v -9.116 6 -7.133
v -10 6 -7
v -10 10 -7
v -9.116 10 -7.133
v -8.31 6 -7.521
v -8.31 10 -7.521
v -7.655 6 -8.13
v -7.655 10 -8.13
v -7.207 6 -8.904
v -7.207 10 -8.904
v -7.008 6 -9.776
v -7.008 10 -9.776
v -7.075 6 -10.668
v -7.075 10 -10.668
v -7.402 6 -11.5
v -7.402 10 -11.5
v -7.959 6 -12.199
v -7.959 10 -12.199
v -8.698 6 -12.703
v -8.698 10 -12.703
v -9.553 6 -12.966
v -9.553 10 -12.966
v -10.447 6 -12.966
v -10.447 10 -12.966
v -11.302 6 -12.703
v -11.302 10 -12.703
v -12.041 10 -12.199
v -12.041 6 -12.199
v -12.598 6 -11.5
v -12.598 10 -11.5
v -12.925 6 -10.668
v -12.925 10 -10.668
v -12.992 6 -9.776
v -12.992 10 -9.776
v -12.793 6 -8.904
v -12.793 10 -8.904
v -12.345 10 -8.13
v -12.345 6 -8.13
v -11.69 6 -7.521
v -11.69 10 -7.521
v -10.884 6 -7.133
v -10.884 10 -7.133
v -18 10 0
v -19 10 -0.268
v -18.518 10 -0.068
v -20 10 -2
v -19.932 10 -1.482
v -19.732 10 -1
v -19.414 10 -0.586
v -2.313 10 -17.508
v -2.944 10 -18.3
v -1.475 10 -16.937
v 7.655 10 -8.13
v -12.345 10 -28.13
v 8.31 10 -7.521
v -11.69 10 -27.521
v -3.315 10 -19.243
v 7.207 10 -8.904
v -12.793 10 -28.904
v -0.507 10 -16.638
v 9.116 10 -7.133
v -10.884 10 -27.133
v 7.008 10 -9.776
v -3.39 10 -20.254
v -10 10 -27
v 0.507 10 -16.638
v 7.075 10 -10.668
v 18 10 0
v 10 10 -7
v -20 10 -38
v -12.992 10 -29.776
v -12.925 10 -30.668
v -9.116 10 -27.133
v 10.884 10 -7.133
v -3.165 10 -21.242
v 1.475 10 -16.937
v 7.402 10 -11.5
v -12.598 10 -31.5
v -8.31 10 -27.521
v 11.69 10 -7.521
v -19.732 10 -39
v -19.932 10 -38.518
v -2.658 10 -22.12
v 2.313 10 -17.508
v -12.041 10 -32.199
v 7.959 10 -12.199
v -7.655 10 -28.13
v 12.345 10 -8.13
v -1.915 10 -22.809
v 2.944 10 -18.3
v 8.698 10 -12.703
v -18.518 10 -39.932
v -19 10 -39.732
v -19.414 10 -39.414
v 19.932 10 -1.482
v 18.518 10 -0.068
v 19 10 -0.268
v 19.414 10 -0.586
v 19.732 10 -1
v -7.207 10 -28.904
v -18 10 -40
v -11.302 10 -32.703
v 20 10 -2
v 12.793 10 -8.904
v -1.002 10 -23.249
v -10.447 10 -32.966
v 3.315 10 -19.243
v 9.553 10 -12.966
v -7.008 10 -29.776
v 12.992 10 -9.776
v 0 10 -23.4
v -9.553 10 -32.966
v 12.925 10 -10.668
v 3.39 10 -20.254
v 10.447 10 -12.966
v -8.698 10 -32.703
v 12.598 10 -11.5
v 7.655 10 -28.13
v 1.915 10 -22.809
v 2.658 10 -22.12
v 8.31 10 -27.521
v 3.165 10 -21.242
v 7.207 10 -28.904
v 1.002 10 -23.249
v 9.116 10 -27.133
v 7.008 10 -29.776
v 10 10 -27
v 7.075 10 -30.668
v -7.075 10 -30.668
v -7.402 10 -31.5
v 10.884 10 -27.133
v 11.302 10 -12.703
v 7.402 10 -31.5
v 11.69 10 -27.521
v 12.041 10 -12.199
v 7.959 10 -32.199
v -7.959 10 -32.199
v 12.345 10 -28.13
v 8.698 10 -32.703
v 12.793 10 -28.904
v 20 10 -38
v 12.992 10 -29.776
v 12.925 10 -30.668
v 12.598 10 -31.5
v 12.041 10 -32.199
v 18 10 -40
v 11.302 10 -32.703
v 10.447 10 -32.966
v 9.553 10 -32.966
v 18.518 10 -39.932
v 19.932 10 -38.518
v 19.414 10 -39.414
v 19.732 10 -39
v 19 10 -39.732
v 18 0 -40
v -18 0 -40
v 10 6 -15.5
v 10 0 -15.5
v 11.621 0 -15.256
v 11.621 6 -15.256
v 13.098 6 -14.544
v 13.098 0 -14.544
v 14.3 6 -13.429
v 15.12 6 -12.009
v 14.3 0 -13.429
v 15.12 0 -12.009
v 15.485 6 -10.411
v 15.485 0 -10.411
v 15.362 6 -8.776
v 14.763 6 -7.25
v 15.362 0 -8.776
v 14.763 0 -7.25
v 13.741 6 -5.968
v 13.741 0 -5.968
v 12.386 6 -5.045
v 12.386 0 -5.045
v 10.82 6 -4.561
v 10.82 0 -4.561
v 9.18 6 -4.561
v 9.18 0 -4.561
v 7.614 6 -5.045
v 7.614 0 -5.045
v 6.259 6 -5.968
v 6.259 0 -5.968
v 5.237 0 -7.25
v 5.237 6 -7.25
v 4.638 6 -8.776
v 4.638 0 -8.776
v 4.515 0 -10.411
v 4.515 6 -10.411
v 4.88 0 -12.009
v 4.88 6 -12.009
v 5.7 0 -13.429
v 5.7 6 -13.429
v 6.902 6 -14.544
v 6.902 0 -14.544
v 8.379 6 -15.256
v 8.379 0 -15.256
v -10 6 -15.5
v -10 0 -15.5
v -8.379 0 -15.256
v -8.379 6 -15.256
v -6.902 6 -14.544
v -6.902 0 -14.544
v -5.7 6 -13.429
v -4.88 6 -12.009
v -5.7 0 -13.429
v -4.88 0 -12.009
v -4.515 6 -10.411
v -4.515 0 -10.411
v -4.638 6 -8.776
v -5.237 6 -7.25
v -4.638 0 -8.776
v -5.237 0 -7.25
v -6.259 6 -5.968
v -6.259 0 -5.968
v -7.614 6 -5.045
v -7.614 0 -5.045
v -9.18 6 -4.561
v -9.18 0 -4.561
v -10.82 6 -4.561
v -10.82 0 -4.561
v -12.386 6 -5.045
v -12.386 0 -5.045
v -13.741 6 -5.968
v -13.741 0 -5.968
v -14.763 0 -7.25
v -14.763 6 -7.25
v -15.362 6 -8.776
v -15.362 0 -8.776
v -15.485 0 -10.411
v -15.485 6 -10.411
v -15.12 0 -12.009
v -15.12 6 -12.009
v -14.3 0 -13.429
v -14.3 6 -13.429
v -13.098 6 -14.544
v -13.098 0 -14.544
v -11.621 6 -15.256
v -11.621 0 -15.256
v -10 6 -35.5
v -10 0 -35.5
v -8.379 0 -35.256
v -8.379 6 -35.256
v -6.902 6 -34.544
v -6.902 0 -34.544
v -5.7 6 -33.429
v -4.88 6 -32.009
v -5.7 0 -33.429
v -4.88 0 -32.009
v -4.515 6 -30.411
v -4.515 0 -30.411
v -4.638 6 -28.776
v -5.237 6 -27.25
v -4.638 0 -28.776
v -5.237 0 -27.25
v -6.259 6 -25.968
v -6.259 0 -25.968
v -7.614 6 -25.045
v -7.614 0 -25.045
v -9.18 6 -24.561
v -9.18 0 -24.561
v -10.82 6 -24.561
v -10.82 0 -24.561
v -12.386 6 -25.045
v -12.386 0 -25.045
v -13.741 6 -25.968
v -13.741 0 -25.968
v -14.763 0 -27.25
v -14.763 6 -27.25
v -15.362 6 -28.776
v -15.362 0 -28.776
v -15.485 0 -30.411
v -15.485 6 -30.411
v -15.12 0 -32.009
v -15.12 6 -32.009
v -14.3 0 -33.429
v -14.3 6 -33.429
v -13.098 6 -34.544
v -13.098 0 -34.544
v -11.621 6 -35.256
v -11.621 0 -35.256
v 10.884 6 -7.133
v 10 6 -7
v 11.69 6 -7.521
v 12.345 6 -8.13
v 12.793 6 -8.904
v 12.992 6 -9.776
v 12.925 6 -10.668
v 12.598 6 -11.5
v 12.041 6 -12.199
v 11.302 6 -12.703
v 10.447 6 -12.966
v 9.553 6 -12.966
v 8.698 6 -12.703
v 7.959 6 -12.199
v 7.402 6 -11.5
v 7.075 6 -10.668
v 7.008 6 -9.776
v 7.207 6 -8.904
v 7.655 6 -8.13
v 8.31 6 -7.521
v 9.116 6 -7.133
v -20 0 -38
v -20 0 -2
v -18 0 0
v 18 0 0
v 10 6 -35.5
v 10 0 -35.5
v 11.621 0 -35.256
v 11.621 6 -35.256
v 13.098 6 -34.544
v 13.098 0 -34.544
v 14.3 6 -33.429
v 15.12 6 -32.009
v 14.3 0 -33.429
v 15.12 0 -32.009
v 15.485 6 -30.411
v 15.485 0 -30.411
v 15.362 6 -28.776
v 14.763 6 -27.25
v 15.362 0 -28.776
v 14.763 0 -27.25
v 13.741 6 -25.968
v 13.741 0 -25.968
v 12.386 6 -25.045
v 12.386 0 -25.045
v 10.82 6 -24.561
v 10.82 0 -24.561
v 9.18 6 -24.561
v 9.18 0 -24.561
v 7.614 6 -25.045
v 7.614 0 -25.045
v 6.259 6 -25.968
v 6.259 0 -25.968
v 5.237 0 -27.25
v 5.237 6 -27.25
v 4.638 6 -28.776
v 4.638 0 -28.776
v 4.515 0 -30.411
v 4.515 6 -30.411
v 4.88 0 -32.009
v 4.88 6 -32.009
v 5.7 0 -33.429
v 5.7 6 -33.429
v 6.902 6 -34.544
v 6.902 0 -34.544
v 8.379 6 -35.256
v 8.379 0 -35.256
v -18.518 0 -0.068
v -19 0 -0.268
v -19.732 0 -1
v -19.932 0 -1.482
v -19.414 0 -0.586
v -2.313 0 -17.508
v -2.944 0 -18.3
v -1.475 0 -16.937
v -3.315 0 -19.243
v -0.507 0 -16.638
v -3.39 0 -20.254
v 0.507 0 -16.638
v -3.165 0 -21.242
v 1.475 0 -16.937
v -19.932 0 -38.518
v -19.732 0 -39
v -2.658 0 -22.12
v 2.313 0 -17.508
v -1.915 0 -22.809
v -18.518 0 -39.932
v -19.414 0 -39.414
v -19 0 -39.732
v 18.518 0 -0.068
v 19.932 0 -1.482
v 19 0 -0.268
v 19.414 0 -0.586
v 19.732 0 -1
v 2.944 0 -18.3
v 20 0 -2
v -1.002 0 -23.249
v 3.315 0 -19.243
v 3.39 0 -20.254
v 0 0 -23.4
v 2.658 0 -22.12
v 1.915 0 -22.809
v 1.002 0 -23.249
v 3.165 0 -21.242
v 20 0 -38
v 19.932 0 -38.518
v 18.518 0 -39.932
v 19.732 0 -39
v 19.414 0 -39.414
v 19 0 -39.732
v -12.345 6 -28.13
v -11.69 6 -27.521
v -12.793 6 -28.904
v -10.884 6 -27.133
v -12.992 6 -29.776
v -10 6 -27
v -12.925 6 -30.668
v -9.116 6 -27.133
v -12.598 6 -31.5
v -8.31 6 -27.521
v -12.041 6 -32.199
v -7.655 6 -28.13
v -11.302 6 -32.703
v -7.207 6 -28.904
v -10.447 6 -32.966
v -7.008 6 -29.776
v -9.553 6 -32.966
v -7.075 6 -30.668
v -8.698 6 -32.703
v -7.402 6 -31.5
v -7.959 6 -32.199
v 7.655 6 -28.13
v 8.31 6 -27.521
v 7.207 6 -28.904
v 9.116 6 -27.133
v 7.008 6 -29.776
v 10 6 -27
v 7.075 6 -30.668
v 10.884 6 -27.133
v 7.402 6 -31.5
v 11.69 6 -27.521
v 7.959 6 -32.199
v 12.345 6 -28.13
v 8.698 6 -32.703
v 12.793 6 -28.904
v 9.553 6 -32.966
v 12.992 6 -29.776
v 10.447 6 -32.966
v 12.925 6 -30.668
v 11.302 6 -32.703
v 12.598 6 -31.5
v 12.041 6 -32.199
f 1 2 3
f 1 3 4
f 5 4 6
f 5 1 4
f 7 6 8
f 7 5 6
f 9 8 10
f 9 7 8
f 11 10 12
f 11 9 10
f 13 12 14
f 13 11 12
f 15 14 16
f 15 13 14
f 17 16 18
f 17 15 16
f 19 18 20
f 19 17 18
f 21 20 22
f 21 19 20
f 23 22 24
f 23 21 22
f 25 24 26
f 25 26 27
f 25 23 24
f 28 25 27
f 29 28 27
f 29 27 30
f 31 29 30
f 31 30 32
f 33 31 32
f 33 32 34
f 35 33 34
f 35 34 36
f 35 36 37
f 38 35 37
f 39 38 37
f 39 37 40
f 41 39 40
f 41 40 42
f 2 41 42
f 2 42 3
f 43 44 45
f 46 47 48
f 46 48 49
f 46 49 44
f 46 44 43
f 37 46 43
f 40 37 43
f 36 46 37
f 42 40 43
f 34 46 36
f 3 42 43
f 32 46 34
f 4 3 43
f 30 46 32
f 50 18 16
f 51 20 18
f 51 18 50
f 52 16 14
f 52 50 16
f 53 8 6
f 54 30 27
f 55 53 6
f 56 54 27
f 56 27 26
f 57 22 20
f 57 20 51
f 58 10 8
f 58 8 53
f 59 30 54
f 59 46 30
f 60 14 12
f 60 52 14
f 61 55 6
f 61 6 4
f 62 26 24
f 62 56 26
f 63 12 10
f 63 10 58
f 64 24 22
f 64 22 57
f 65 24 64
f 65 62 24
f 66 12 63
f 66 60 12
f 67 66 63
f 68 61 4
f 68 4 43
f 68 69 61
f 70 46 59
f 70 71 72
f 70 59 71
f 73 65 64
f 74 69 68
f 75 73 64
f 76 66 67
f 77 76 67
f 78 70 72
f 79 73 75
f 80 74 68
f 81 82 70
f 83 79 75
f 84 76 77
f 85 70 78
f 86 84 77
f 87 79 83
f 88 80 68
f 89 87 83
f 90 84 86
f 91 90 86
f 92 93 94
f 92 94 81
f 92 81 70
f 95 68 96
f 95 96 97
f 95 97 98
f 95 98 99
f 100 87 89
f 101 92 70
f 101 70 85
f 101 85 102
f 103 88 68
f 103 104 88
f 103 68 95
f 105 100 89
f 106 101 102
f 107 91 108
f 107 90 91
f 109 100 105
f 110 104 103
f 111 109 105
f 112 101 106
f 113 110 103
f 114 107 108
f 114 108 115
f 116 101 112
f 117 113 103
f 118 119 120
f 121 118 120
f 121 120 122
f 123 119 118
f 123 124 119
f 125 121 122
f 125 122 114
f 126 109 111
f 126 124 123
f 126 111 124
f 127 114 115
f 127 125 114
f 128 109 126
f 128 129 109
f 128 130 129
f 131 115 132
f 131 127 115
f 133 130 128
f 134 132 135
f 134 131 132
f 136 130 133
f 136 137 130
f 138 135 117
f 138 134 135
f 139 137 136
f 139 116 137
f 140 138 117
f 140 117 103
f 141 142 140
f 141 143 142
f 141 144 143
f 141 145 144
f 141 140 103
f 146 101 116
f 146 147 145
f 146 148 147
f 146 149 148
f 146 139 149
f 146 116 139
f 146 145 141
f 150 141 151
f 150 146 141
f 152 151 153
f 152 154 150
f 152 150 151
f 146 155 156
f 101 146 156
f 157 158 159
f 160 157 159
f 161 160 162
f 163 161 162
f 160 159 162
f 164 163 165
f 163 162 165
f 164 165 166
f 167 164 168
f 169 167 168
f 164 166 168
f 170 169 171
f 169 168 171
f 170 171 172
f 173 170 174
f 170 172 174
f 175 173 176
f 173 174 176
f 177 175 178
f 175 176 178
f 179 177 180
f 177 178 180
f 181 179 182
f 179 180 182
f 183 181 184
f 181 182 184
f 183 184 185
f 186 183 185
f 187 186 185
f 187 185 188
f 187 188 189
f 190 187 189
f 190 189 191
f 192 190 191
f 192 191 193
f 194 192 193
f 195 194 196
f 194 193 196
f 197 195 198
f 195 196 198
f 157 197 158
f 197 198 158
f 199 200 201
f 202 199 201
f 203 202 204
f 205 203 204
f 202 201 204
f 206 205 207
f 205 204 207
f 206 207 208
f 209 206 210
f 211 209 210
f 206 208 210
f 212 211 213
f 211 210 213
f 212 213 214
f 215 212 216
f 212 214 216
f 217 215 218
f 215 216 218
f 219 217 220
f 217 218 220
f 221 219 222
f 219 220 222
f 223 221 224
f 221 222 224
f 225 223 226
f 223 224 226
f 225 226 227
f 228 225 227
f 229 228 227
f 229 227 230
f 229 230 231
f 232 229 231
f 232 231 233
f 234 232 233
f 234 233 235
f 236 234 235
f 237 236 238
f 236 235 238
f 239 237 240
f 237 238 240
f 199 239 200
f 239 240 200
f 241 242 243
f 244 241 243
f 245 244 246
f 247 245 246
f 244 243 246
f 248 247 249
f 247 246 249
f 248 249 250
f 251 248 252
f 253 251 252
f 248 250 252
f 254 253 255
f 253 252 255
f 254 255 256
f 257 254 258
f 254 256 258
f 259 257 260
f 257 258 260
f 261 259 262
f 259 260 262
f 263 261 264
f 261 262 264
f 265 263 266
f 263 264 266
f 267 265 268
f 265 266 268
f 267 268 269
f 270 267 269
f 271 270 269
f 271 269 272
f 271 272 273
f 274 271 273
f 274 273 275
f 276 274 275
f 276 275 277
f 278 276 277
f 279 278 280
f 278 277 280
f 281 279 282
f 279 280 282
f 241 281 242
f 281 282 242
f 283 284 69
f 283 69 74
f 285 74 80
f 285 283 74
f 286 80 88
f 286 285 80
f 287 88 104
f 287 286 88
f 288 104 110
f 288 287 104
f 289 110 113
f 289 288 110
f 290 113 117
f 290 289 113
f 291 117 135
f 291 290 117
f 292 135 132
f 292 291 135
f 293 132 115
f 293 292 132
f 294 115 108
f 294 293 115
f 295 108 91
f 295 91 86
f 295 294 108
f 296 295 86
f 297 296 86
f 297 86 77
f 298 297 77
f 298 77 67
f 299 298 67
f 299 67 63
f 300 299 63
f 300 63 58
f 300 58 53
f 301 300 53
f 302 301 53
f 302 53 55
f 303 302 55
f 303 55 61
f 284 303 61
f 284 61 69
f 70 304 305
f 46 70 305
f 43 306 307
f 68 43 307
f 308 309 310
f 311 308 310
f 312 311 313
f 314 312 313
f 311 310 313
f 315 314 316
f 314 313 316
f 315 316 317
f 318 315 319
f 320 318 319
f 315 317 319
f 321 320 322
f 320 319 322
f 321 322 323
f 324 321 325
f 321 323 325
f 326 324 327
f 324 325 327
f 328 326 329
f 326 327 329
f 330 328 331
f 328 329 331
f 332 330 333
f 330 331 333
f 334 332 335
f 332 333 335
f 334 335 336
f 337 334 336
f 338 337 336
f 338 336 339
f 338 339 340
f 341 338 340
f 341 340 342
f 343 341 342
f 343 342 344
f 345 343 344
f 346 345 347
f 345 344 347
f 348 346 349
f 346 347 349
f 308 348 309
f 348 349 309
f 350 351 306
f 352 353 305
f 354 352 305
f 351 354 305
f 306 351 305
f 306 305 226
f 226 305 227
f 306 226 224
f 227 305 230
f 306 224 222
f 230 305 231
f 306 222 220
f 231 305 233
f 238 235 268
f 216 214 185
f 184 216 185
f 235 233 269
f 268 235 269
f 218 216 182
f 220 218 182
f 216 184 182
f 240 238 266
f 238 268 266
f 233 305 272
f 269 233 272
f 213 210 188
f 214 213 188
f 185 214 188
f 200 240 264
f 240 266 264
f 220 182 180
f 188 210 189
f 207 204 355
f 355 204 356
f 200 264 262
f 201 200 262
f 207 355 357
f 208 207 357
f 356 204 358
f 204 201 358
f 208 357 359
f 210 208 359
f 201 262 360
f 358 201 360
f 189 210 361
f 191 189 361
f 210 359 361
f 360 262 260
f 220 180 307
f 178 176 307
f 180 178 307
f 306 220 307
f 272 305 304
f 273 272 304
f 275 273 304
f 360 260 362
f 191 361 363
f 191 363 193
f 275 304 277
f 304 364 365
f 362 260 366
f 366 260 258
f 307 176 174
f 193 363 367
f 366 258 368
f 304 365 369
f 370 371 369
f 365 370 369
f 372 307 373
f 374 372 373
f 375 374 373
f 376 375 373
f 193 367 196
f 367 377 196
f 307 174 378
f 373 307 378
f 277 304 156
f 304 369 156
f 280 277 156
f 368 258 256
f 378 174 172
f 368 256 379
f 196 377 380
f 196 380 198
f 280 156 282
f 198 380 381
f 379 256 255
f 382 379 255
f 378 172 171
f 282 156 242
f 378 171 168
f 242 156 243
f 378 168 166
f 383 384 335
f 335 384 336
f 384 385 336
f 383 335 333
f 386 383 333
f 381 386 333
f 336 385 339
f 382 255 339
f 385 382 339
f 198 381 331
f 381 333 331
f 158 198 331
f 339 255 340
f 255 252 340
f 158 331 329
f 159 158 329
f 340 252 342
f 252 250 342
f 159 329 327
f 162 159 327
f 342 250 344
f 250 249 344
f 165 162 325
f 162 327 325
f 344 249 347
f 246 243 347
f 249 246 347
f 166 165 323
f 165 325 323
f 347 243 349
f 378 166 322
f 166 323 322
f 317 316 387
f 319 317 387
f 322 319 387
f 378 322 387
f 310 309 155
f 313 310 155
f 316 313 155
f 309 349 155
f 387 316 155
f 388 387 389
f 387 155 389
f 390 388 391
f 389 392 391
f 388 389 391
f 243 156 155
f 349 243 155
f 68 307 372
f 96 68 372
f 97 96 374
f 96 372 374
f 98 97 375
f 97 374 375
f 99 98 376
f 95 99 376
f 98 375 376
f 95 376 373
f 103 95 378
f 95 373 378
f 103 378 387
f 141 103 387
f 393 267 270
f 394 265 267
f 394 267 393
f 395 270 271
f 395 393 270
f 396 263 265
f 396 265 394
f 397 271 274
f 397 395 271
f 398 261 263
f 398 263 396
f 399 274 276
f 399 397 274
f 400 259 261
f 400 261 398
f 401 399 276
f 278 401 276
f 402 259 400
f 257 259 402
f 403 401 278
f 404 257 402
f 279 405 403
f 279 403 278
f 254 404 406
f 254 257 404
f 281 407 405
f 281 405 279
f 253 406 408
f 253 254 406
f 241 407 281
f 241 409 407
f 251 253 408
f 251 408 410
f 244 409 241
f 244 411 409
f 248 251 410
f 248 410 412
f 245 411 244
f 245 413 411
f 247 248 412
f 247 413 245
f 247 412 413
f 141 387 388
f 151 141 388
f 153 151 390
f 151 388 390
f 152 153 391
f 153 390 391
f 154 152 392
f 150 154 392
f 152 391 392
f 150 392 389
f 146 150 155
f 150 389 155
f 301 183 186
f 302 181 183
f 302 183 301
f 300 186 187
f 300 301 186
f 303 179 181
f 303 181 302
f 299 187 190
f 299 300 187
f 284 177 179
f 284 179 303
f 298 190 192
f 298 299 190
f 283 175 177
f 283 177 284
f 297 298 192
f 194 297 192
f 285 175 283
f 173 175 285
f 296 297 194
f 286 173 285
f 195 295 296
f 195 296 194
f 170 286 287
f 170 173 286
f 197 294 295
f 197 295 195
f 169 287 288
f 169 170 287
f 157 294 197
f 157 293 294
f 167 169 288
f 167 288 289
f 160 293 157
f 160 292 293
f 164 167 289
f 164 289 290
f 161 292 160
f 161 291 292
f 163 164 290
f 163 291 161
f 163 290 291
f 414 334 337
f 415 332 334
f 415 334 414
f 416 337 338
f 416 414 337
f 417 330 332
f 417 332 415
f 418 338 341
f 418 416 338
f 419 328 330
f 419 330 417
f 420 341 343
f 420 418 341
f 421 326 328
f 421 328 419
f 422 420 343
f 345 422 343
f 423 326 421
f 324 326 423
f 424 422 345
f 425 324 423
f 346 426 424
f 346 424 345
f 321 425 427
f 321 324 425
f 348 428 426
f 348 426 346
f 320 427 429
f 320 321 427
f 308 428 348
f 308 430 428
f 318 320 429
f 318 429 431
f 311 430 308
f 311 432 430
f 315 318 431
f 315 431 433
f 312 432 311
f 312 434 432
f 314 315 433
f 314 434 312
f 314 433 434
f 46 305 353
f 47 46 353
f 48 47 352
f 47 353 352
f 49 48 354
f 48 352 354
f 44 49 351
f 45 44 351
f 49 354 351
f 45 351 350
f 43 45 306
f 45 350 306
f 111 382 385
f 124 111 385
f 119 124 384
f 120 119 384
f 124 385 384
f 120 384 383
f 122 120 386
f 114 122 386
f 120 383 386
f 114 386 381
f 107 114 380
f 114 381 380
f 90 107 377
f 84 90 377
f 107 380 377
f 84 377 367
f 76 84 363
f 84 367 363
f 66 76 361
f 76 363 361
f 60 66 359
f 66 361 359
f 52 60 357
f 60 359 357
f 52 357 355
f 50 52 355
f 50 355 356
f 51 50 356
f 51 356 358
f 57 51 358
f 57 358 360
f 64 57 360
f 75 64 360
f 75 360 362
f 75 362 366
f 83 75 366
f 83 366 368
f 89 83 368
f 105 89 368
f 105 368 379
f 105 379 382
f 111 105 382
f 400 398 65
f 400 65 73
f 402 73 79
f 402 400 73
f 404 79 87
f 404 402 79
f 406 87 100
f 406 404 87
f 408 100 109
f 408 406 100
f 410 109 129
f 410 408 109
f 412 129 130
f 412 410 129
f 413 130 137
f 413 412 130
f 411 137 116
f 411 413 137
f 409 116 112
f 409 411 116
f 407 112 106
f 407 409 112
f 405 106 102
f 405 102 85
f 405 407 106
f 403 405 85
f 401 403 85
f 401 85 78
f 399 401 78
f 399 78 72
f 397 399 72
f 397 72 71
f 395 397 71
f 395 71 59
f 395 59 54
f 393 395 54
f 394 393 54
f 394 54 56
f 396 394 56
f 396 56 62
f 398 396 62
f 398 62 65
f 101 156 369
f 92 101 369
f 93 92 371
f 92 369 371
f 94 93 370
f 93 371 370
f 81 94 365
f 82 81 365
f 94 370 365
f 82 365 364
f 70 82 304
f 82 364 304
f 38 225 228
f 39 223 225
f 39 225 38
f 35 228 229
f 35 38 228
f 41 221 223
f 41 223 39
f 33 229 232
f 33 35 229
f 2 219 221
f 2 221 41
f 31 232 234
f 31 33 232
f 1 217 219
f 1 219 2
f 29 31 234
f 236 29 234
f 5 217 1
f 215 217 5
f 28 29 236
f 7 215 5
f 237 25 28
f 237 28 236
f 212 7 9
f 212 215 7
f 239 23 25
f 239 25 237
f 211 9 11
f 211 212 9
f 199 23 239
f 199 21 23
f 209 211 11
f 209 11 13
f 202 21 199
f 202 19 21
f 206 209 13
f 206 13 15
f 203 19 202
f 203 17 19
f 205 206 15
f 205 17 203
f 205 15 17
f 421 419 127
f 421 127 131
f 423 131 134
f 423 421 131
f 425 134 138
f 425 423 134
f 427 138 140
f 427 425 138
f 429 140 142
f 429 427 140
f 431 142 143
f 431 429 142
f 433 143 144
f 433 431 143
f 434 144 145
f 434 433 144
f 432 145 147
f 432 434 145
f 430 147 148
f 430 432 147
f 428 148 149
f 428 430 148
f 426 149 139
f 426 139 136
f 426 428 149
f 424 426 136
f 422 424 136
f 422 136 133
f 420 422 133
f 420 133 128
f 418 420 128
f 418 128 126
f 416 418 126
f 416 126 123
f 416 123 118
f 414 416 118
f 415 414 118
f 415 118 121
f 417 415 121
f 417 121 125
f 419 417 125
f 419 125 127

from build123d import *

# Parameters (mm, degrees)
SKETCH_1_R             = 3
EXTRUDE_1_DEPTH        = 10
SKETCH_3_R             = 5.5
CUT_EXTRUDE_1_DEPTH    = 6
HOLE_WIZARD_M8_1_D     = 6.8
HOLE_WIZARD_M8_1_DEPTH = 38.75
HOLE_WIZARD_M8_1_TIP   = 2.042926105


with BuildPart() as part:
    # 草图1 → 凸台-拉伸1 (new body)
    with BuildSketch(Plane(origin=(0, 0, 0), x_dir=(1, 0, 0), z_dir=(0, 1, 0))):
        with BuildLine():
            Line((-18, 0), (18, 0))
            ThreePointArc((18, 0), (19.414213562, 0.585786438), (20, 2))
            Line((20, 2), (20, 38))
            ThreePointArc((20, 38), (19.414213562, 39.414213562), (18, 40))
            Line((18, 40), (-18, 40))
            ThreePointArc((-18, 40), (-19.414213562, 39.414213562), (-20, 38))
            Line((-20, 38), (-20, 2))
            ThreePointArc((-20, 2), (-19.414213562, 0.585786438), (-18, 0))
        make_face()
        with Locations(Location((10, 30, 0), (0, 0, 270))):
            Circle(SKETCH_1_R, mode=Mode.SUBTRACT)
        with Locations(Location((-10, 30, 0), (0, 0, 270))):
            Circle(SKETCH_1_R, mode=Mode.SUBTRACT)
        with Locations(Location((-10, 10, 0), (0, 0, 270))):
            Circle(SKETCH_1_R, mode=Mode.SUBTRACT)
        with Locations(Location((10, 10, 0), (0, 0, 270))):
            Circle(SKETCH_1_R, mode=Mode.SUBTRACT)
    extrude(amount=EXTRUDE_1_DEPTH)

    # 草图3 → 切除-拉伸1 (cut)
    with BuildSketch(Plane.XZ):
        with Locations(Location((-10, -10, 0), (0, 0, 270))):
            Circle(SKETCH_3_R)
        with Locations(Location((10, -10, 0), (0, 0, 270))):
            Circle(SKETCH_3_R)
        with Locations(Location((10, -30, 0), (0, 0, 270))):
            Circle(SKETCH_3_R)
        with Locations(Location((-10, -30, 0), (0, 0, 270))):
            Circle(SKETCH_3_R)
    extrude(amount=-CUT_EXTRUDE_1_DEPTH, mode=Mode.SUBTRACT)

    # M8 螺纹孔1
    with Locations(Plane(origin=(0, 10, -20), x_dir=(0, 0, 1), z_dir=(0, 1, 0))):
        with Locations((0, 0)):
            Hole(HOLE_WIZARD_M8_1_D / 2, depth=HOLE_WIZARD_M8_1_DEPTH)
            with Locations((0, 0, -(HOLE_WIZARD_M8_1_DEPTH + HOLE_WIZARD_M8_1_TIP / 2))):  # 118° drill point
                Cone(0, HOLE_WIZARD_M8_1_D / 2, HOLE_WIZARD_M8_1_TIP, mode=Mode.SUBTRACT)


solid = part.part
